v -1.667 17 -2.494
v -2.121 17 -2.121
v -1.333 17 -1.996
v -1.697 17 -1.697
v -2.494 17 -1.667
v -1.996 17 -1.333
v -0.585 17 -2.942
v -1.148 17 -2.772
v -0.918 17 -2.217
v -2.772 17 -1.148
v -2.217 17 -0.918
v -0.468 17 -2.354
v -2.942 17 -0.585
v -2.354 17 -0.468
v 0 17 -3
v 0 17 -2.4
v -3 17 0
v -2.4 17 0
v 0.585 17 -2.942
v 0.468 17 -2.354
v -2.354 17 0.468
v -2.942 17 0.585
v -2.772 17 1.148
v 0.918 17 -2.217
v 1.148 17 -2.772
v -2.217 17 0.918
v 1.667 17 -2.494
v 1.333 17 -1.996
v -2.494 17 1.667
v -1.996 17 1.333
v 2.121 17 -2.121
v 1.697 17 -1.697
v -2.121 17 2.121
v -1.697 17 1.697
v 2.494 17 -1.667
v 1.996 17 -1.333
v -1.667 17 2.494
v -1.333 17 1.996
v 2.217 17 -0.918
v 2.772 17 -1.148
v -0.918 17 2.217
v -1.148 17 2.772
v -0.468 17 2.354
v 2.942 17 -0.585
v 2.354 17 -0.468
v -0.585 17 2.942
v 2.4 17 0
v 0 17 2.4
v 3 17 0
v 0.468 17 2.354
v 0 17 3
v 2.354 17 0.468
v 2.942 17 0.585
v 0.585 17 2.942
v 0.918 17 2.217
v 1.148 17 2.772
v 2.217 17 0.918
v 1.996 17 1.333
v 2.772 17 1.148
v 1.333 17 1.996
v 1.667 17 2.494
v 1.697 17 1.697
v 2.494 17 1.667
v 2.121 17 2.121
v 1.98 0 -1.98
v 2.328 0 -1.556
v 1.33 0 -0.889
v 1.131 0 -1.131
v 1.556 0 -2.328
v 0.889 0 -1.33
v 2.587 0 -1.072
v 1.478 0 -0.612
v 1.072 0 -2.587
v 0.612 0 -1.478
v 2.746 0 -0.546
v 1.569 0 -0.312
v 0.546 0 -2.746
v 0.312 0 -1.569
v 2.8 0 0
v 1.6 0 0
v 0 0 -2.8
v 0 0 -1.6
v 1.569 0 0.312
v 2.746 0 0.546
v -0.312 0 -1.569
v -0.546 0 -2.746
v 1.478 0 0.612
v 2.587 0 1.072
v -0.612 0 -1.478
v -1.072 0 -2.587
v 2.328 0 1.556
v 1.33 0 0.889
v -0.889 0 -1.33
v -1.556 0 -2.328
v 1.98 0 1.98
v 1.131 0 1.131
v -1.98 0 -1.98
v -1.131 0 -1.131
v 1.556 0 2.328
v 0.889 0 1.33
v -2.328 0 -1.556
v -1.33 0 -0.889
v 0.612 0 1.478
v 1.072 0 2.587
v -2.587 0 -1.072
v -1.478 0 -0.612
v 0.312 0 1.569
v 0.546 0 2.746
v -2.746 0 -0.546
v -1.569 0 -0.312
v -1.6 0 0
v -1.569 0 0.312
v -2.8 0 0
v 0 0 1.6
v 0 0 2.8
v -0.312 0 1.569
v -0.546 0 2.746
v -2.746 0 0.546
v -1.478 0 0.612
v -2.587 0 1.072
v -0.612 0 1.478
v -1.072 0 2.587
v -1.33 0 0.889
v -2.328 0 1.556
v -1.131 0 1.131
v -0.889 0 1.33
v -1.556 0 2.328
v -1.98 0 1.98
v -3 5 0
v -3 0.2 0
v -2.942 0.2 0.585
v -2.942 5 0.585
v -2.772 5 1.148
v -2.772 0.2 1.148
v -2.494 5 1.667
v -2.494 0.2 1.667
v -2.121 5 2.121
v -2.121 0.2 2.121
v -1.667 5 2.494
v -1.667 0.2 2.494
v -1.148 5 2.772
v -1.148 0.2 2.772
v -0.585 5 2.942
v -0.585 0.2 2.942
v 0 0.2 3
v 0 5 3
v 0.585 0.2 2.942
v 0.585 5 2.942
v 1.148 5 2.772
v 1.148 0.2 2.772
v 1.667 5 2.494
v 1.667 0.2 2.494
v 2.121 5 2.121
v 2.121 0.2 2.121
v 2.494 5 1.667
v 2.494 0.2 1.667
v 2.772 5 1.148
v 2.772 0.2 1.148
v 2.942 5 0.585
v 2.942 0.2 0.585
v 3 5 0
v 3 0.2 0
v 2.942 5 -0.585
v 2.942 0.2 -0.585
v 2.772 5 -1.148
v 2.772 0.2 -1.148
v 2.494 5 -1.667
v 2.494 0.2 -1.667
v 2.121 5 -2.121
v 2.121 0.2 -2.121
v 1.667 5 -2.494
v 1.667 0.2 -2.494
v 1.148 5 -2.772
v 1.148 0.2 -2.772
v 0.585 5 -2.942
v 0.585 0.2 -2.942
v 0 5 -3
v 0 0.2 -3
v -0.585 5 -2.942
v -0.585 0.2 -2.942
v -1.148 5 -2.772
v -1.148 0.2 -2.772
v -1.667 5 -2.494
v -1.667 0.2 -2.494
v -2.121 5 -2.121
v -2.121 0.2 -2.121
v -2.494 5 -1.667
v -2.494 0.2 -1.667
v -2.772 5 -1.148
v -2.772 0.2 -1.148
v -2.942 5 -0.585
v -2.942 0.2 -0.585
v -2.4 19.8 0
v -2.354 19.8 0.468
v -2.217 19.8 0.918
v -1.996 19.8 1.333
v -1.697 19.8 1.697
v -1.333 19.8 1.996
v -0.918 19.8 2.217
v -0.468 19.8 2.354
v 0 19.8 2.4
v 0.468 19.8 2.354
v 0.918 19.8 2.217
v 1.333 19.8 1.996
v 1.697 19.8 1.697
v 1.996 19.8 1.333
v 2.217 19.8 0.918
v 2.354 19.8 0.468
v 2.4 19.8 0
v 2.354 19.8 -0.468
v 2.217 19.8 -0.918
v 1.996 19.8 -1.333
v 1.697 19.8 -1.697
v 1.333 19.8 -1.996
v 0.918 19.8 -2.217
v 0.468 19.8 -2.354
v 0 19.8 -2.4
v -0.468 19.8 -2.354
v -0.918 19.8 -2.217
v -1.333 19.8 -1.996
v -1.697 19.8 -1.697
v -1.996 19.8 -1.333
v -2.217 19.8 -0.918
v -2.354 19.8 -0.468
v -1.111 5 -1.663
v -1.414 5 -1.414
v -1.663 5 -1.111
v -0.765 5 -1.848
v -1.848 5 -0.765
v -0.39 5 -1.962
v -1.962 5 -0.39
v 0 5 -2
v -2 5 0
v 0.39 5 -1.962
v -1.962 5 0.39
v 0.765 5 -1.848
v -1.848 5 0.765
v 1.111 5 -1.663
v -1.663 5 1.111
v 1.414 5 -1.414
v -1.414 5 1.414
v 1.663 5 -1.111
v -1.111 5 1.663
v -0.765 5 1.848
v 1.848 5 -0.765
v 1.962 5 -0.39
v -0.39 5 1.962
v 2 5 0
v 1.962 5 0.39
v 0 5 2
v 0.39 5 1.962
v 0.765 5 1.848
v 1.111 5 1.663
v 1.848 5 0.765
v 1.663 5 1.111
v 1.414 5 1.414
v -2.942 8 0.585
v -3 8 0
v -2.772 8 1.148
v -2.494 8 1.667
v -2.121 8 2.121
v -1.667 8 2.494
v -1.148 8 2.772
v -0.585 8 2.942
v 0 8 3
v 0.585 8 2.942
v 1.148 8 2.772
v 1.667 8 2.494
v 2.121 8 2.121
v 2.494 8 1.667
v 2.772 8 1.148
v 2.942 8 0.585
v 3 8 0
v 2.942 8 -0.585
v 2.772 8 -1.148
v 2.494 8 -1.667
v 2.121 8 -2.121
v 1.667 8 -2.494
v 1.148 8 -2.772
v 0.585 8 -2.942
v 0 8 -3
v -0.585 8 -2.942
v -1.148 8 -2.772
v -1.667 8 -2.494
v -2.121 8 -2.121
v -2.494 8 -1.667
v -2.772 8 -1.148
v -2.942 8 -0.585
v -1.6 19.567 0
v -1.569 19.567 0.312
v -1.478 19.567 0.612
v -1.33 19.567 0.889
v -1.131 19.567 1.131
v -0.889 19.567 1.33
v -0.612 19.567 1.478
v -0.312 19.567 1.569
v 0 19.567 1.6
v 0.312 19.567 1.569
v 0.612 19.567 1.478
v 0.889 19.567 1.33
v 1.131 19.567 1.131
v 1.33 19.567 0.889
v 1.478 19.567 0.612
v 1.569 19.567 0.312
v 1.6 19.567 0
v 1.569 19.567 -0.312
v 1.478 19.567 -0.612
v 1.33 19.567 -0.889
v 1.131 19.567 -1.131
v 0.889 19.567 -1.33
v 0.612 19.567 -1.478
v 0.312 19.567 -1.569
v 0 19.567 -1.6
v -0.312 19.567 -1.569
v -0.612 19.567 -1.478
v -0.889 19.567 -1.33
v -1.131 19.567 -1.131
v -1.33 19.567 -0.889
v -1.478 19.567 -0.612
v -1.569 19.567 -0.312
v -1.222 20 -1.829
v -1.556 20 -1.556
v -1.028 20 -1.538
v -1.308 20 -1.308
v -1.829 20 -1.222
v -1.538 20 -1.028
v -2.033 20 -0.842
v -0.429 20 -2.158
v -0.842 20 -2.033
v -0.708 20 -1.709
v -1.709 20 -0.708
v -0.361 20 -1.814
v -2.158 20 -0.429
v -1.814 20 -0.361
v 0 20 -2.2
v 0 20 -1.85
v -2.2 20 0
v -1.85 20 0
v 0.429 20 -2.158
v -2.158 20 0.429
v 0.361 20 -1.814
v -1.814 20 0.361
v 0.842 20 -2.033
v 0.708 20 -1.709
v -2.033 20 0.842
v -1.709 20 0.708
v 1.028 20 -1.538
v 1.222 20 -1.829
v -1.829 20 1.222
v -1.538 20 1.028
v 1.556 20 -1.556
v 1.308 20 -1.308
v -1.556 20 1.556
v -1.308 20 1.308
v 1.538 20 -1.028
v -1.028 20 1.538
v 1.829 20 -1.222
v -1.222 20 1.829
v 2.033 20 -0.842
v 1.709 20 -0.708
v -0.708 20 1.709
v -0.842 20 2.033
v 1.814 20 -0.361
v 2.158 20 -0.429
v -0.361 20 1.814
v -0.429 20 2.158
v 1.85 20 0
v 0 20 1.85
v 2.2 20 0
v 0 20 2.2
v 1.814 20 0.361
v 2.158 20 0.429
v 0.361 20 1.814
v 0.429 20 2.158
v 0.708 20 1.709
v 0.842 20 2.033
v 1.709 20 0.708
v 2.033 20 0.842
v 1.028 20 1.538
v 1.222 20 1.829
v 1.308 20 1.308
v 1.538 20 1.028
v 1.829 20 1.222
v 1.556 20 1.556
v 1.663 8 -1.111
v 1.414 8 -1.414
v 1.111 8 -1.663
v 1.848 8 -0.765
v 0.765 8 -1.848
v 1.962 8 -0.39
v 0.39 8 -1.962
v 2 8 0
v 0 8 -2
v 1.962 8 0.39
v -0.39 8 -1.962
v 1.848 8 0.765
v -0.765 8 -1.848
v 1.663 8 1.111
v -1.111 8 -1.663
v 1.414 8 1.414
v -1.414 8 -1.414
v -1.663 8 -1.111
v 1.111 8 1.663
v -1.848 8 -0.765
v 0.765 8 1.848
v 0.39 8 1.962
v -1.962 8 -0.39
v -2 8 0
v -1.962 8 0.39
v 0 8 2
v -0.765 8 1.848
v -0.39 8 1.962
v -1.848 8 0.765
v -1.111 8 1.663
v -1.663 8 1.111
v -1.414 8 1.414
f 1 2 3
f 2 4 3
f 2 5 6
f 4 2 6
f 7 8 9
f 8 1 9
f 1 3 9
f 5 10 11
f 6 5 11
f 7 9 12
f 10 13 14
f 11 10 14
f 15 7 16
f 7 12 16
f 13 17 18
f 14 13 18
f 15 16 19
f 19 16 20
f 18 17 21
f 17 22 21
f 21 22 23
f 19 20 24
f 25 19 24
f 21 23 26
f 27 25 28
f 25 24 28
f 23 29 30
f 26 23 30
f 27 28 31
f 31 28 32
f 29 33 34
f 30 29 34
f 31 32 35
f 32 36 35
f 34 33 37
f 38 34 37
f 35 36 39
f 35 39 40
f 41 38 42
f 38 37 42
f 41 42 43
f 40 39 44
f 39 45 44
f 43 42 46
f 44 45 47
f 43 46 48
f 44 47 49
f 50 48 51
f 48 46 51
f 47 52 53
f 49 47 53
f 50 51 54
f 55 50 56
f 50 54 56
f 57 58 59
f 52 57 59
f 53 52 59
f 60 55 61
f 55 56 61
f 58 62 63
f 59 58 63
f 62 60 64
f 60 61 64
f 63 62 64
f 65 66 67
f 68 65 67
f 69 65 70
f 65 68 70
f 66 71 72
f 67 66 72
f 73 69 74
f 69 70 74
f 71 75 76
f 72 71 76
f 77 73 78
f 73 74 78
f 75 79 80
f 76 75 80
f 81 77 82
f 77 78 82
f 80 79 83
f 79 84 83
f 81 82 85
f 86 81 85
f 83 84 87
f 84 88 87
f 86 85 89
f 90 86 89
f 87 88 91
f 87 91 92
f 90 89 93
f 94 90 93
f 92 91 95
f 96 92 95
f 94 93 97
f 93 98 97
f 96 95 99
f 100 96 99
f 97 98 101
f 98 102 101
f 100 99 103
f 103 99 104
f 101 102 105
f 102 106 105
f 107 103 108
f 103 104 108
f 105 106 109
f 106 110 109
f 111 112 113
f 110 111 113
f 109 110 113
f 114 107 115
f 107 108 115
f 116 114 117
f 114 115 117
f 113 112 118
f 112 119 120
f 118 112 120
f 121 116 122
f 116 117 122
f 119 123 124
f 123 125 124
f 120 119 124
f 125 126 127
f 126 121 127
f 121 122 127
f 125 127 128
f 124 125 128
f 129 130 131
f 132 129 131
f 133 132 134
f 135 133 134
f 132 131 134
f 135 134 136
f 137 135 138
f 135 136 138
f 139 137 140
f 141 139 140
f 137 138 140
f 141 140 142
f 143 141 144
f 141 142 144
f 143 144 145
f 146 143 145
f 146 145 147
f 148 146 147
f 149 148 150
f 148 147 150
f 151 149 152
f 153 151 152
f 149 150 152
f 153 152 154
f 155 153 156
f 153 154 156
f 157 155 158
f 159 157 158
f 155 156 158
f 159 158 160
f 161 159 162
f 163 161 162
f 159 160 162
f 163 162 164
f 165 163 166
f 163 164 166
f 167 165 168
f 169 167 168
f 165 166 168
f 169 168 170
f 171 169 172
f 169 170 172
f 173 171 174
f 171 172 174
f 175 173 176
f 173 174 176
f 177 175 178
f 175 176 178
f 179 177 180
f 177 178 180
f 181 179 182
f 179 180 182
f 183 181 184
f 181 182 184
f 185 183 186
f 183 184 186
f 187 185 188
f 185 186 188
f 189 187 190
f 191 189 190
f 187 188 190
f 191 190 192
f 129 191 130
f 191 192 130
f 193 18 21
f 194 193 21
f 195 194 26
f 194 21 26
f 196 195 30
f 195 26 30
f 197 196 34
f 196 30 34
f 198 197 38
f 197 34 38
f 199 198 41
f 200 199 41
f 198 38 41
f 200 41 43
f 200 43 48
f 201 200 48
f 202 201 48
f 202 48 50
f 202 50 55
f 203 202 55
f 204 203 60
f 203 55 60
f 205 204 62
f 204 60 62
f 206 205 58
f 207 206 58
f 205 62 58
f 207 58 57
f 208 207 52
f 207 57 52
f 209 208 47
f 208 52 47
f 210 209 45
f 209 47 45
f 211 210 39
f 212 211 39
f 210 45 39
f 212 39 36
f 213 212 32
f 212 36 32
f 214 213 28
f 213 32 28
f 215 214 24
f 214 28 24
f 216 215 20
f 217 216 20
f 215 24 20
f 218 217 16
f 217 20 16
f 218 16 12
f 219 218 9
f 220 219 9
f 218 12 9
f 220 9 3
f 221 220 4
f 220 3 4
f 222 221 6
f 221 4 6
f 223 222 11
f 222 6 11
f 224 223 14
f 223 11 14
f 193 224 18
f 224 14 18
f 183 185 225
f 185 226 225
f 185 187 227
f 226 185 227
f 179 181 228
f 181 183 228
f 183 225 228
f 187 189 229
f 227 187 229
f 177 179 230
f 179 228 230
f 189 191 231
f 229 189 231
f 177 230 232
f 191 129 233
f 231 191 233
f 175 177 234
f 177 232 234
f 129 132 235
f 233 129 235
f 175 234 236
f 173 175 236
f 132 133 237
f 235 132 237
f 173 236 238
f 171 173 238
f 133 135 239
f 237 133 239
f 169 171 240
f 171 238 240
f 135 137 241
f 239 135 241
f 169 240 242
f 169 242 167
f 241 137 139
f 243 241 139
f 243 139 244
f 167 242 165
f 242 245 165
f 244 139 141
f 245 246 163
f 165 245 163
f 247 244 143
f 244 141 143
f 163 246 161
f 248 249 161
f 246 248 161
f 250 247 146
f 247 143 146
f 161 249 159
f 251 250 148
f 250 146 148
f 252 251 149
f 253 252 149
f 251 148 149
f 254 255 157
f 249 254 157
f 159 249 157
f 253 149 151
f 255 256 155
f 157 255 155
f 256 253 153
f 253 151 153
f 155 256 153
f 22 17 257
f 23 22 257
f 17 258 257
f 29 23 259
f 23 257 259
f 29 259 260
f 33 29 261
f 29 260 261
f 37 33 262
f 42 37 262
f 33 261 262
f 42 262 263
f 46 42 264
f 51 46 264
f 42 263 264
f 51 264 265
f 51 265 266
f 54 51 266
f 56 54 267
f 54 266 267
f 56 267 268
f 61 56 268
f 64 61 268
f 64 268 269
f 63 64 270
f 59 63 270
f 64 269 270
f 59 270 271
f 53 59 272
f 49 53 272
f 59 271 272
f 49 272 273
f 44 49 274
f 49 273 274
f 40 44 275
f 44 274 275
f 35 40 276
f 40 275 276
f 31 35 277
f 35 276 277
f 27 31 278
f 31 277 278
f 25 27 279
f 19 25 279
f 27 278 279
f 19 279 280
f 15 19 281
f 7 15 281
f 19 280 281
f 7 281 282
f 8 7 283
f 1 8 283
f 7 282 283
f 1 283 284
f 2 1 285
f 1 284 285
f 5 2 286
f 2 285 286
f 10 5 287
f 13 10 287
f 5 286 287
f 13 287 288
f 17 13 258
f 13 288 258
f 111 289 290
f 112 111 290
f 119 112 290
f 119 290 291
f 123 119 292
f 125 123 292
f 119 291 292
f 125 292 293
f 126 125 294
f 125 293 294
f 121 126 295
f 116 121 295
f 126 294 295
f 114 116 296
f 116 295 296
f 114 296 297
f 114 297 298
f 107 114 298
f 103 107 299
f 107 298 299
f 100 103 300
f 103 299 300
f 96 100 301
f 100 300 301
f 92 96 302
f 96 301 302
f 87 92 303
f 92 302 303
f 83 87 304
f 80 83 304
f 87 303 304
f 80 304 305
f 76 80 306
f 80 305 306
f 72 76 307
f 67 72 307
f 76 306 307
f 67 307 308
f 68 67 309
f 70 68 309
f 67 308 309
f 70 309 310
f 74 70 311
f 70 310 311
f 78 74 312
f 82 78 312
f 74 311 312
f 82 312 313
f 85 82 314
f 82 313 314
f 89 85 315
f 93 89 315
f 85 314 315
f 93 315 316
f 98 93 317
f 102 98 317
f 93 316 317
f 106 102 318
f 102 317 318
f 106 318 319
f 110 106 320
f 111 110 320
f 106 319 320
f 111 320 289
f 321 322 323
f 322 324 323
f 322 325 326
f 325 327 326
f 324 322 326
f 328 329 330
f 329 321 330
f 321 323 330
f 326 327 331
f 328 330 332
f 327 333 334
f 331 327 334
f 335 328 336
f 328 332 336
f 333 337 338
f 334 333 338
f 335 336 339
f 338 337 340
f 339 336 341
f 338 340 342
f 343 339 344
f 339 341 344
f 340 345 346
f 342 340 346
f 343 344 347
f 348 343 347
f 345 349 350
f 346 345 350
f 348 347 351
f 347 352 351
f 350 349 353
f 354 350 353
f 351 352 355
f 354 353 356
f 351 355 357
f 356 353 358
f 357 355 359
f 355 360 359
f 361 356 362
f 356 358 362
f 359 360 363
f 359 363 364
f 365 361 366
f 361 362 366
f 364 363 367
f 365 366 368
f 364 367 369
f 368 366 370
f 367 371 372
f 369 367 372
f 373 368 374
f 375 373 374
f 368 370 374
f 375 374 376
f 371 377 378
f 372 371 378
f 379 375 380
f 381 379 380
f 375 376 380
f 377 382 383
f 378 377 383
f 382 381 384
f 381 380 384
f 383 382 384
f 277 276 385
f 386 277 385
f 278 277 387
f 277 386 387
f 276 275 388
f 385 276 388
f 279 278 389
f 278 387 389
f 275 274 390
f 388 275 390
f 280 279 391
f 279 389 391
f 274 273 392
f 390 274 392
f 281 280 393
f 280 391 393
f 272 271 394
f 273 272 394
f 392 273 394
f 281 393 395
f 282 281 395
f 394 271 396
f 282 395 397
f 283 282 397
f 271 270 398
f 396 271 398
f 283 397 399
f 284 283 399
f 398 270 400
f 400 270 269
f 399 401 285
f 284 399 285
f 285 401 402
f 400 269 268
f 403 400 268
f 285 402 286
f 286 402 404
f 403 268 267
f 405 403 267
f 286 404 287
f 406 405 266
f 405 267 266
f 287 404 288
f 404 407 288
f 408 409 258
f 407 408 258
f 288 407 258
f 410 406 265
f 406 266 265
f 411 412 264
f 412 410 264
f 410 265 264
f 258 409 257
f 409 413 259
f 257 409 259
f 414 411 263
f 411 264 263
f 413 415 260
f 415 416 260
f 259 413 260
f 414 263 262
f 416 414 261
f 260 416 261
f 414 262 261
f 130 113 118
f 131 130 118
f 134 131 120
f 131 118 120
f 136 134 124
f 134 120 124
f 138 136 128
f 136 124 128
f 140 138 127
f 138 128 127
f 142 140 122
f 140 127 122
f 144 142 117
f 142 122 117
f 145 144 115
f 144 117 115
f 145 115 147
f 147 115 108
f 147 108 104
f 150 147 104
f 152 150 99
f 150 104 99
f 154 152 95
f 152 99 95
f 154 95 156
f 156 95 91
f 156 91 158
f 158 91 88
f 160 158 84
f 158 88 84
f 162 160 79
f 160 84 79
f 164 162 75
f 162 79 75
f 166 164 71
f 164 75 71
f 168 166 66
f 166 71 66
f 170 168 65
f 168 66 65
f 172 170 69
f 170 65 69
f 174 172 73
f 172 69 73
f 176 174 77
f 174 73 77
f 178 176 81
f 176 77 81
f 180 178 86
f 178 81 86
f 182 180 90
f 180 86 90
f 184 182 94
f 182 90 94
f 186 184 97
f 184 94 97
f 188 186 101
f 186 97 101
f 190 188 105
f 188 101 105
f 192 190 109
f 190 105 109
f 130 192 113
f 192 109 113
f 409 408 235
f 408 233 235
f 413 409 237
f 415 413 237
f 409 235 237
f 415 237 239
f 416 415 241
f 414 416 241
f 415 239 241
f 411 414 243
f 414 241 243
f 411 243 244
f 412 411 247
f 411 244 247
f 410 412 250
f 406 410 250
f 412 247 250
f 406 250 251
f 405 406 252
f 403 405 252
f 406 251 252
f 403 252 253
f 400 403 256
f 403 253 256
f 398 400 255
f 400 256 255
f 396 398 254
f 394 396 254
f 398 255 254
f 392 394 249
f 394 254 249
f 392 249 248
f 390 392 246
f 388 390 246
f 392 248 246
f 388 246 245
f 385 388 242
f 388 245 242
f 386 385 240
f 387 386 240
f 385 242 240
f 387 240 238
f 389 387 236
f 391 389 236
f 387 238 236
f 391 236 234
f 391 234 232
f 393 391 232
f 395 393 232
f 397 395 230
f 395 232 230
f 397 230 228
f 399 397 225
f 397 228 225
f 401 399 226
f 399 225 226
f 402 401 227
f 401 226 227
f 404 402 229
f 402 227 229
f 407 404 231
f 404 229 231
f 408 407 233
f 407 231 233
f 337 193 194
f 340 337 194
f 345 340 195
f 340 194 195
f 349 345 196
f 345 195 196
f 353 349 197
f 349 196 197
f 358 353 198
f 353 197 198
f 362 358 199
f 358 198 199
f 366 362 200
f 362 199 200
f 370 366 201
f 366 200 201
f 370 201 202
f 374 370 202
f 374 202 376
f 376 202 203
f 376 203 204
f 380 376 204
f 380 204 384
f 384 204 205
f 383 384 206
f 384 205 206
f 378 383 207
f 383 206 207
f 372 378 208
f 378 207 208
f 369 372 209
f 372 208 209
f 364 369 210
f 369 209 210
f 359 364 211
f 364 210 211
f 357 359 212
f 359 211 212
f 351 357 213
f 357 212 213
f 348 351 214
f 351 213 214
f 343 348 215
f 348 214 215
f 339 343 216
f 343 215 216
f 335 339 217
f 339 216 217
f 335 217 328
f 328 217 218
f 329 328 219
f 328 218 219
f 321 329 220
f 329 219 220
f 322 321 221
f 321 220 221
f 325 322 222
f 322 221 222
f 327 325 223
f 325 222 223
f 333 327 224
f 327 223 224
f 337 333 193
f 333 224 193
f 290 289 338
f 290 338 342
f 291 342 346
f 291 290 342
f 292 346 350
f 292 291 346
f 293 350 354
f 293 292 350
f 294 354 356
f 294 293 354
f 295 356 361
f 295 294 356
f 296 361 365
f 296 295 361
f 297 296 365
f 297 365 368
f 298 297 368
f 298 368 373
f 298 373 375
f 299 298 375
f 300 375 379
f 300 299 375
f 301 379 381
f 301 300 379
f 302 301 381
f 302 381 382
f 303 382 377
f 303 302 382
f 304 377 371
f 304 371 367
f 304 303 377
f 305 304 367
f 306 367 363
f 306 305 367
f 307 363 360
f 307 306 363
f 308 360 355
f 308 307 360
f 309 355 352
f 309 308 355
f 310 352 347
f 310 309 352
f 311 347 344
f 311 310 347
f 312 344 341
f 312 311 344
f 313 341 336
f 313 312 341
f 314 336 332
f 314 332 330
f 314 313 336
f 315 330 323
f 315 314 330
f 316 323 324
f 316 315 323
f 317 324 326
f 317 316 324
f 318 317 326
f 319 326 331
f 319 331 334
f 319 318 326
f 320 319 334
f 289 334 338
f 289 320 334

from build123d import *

# Parameters (mm, degrees)
CHAFL_N4_SIZE  = 0.2
CHAFL_N5_SIZE  = 0.25
CHAFL_N5_SIZE2 = 0.433012702


with BuildPart() as part:
    # Croquis3 → Revolución1 (revolve)
    with BuildSketch(Plane.XY):
        Polygon((-1.6, 0), (-1.6, 20), (-2.4, 20), (-2.4, 17), (-3, 17), (-3, 8), (-2, 8), (-2, 5), (-3, 5), (-3, 0), align=None)
    revolve(axis=Axis((0, 0, 0), (0, 1, 0)))

    # Chaflán4
    chafl_n4_edges = [part.edges().sort_by_distance(p)[0] for p in [
        (2.4, 20, 0),
        (3, 0, 0),
    ]]
    chamfer(chafl_n4_edges, length=CHAFL_N4_SIZE)

    # Chaflán5
    chafl_n5_edges = [part.edges().sort_by_distance(p)[0] for p in [
        (1.6, 20, 0),
    ]]
    chafl_n5_side = [part.faces().sort_by_distance(p)[0] for p in [
        (2.137774603, 20, 0),
    ]]
    chamfer(chafl_n5_edges, length=CHAFL_N5_SIZE, length2=CHAFL_N5_SIZE2, reference=chafl_n5_side[0])


solid = part.part
